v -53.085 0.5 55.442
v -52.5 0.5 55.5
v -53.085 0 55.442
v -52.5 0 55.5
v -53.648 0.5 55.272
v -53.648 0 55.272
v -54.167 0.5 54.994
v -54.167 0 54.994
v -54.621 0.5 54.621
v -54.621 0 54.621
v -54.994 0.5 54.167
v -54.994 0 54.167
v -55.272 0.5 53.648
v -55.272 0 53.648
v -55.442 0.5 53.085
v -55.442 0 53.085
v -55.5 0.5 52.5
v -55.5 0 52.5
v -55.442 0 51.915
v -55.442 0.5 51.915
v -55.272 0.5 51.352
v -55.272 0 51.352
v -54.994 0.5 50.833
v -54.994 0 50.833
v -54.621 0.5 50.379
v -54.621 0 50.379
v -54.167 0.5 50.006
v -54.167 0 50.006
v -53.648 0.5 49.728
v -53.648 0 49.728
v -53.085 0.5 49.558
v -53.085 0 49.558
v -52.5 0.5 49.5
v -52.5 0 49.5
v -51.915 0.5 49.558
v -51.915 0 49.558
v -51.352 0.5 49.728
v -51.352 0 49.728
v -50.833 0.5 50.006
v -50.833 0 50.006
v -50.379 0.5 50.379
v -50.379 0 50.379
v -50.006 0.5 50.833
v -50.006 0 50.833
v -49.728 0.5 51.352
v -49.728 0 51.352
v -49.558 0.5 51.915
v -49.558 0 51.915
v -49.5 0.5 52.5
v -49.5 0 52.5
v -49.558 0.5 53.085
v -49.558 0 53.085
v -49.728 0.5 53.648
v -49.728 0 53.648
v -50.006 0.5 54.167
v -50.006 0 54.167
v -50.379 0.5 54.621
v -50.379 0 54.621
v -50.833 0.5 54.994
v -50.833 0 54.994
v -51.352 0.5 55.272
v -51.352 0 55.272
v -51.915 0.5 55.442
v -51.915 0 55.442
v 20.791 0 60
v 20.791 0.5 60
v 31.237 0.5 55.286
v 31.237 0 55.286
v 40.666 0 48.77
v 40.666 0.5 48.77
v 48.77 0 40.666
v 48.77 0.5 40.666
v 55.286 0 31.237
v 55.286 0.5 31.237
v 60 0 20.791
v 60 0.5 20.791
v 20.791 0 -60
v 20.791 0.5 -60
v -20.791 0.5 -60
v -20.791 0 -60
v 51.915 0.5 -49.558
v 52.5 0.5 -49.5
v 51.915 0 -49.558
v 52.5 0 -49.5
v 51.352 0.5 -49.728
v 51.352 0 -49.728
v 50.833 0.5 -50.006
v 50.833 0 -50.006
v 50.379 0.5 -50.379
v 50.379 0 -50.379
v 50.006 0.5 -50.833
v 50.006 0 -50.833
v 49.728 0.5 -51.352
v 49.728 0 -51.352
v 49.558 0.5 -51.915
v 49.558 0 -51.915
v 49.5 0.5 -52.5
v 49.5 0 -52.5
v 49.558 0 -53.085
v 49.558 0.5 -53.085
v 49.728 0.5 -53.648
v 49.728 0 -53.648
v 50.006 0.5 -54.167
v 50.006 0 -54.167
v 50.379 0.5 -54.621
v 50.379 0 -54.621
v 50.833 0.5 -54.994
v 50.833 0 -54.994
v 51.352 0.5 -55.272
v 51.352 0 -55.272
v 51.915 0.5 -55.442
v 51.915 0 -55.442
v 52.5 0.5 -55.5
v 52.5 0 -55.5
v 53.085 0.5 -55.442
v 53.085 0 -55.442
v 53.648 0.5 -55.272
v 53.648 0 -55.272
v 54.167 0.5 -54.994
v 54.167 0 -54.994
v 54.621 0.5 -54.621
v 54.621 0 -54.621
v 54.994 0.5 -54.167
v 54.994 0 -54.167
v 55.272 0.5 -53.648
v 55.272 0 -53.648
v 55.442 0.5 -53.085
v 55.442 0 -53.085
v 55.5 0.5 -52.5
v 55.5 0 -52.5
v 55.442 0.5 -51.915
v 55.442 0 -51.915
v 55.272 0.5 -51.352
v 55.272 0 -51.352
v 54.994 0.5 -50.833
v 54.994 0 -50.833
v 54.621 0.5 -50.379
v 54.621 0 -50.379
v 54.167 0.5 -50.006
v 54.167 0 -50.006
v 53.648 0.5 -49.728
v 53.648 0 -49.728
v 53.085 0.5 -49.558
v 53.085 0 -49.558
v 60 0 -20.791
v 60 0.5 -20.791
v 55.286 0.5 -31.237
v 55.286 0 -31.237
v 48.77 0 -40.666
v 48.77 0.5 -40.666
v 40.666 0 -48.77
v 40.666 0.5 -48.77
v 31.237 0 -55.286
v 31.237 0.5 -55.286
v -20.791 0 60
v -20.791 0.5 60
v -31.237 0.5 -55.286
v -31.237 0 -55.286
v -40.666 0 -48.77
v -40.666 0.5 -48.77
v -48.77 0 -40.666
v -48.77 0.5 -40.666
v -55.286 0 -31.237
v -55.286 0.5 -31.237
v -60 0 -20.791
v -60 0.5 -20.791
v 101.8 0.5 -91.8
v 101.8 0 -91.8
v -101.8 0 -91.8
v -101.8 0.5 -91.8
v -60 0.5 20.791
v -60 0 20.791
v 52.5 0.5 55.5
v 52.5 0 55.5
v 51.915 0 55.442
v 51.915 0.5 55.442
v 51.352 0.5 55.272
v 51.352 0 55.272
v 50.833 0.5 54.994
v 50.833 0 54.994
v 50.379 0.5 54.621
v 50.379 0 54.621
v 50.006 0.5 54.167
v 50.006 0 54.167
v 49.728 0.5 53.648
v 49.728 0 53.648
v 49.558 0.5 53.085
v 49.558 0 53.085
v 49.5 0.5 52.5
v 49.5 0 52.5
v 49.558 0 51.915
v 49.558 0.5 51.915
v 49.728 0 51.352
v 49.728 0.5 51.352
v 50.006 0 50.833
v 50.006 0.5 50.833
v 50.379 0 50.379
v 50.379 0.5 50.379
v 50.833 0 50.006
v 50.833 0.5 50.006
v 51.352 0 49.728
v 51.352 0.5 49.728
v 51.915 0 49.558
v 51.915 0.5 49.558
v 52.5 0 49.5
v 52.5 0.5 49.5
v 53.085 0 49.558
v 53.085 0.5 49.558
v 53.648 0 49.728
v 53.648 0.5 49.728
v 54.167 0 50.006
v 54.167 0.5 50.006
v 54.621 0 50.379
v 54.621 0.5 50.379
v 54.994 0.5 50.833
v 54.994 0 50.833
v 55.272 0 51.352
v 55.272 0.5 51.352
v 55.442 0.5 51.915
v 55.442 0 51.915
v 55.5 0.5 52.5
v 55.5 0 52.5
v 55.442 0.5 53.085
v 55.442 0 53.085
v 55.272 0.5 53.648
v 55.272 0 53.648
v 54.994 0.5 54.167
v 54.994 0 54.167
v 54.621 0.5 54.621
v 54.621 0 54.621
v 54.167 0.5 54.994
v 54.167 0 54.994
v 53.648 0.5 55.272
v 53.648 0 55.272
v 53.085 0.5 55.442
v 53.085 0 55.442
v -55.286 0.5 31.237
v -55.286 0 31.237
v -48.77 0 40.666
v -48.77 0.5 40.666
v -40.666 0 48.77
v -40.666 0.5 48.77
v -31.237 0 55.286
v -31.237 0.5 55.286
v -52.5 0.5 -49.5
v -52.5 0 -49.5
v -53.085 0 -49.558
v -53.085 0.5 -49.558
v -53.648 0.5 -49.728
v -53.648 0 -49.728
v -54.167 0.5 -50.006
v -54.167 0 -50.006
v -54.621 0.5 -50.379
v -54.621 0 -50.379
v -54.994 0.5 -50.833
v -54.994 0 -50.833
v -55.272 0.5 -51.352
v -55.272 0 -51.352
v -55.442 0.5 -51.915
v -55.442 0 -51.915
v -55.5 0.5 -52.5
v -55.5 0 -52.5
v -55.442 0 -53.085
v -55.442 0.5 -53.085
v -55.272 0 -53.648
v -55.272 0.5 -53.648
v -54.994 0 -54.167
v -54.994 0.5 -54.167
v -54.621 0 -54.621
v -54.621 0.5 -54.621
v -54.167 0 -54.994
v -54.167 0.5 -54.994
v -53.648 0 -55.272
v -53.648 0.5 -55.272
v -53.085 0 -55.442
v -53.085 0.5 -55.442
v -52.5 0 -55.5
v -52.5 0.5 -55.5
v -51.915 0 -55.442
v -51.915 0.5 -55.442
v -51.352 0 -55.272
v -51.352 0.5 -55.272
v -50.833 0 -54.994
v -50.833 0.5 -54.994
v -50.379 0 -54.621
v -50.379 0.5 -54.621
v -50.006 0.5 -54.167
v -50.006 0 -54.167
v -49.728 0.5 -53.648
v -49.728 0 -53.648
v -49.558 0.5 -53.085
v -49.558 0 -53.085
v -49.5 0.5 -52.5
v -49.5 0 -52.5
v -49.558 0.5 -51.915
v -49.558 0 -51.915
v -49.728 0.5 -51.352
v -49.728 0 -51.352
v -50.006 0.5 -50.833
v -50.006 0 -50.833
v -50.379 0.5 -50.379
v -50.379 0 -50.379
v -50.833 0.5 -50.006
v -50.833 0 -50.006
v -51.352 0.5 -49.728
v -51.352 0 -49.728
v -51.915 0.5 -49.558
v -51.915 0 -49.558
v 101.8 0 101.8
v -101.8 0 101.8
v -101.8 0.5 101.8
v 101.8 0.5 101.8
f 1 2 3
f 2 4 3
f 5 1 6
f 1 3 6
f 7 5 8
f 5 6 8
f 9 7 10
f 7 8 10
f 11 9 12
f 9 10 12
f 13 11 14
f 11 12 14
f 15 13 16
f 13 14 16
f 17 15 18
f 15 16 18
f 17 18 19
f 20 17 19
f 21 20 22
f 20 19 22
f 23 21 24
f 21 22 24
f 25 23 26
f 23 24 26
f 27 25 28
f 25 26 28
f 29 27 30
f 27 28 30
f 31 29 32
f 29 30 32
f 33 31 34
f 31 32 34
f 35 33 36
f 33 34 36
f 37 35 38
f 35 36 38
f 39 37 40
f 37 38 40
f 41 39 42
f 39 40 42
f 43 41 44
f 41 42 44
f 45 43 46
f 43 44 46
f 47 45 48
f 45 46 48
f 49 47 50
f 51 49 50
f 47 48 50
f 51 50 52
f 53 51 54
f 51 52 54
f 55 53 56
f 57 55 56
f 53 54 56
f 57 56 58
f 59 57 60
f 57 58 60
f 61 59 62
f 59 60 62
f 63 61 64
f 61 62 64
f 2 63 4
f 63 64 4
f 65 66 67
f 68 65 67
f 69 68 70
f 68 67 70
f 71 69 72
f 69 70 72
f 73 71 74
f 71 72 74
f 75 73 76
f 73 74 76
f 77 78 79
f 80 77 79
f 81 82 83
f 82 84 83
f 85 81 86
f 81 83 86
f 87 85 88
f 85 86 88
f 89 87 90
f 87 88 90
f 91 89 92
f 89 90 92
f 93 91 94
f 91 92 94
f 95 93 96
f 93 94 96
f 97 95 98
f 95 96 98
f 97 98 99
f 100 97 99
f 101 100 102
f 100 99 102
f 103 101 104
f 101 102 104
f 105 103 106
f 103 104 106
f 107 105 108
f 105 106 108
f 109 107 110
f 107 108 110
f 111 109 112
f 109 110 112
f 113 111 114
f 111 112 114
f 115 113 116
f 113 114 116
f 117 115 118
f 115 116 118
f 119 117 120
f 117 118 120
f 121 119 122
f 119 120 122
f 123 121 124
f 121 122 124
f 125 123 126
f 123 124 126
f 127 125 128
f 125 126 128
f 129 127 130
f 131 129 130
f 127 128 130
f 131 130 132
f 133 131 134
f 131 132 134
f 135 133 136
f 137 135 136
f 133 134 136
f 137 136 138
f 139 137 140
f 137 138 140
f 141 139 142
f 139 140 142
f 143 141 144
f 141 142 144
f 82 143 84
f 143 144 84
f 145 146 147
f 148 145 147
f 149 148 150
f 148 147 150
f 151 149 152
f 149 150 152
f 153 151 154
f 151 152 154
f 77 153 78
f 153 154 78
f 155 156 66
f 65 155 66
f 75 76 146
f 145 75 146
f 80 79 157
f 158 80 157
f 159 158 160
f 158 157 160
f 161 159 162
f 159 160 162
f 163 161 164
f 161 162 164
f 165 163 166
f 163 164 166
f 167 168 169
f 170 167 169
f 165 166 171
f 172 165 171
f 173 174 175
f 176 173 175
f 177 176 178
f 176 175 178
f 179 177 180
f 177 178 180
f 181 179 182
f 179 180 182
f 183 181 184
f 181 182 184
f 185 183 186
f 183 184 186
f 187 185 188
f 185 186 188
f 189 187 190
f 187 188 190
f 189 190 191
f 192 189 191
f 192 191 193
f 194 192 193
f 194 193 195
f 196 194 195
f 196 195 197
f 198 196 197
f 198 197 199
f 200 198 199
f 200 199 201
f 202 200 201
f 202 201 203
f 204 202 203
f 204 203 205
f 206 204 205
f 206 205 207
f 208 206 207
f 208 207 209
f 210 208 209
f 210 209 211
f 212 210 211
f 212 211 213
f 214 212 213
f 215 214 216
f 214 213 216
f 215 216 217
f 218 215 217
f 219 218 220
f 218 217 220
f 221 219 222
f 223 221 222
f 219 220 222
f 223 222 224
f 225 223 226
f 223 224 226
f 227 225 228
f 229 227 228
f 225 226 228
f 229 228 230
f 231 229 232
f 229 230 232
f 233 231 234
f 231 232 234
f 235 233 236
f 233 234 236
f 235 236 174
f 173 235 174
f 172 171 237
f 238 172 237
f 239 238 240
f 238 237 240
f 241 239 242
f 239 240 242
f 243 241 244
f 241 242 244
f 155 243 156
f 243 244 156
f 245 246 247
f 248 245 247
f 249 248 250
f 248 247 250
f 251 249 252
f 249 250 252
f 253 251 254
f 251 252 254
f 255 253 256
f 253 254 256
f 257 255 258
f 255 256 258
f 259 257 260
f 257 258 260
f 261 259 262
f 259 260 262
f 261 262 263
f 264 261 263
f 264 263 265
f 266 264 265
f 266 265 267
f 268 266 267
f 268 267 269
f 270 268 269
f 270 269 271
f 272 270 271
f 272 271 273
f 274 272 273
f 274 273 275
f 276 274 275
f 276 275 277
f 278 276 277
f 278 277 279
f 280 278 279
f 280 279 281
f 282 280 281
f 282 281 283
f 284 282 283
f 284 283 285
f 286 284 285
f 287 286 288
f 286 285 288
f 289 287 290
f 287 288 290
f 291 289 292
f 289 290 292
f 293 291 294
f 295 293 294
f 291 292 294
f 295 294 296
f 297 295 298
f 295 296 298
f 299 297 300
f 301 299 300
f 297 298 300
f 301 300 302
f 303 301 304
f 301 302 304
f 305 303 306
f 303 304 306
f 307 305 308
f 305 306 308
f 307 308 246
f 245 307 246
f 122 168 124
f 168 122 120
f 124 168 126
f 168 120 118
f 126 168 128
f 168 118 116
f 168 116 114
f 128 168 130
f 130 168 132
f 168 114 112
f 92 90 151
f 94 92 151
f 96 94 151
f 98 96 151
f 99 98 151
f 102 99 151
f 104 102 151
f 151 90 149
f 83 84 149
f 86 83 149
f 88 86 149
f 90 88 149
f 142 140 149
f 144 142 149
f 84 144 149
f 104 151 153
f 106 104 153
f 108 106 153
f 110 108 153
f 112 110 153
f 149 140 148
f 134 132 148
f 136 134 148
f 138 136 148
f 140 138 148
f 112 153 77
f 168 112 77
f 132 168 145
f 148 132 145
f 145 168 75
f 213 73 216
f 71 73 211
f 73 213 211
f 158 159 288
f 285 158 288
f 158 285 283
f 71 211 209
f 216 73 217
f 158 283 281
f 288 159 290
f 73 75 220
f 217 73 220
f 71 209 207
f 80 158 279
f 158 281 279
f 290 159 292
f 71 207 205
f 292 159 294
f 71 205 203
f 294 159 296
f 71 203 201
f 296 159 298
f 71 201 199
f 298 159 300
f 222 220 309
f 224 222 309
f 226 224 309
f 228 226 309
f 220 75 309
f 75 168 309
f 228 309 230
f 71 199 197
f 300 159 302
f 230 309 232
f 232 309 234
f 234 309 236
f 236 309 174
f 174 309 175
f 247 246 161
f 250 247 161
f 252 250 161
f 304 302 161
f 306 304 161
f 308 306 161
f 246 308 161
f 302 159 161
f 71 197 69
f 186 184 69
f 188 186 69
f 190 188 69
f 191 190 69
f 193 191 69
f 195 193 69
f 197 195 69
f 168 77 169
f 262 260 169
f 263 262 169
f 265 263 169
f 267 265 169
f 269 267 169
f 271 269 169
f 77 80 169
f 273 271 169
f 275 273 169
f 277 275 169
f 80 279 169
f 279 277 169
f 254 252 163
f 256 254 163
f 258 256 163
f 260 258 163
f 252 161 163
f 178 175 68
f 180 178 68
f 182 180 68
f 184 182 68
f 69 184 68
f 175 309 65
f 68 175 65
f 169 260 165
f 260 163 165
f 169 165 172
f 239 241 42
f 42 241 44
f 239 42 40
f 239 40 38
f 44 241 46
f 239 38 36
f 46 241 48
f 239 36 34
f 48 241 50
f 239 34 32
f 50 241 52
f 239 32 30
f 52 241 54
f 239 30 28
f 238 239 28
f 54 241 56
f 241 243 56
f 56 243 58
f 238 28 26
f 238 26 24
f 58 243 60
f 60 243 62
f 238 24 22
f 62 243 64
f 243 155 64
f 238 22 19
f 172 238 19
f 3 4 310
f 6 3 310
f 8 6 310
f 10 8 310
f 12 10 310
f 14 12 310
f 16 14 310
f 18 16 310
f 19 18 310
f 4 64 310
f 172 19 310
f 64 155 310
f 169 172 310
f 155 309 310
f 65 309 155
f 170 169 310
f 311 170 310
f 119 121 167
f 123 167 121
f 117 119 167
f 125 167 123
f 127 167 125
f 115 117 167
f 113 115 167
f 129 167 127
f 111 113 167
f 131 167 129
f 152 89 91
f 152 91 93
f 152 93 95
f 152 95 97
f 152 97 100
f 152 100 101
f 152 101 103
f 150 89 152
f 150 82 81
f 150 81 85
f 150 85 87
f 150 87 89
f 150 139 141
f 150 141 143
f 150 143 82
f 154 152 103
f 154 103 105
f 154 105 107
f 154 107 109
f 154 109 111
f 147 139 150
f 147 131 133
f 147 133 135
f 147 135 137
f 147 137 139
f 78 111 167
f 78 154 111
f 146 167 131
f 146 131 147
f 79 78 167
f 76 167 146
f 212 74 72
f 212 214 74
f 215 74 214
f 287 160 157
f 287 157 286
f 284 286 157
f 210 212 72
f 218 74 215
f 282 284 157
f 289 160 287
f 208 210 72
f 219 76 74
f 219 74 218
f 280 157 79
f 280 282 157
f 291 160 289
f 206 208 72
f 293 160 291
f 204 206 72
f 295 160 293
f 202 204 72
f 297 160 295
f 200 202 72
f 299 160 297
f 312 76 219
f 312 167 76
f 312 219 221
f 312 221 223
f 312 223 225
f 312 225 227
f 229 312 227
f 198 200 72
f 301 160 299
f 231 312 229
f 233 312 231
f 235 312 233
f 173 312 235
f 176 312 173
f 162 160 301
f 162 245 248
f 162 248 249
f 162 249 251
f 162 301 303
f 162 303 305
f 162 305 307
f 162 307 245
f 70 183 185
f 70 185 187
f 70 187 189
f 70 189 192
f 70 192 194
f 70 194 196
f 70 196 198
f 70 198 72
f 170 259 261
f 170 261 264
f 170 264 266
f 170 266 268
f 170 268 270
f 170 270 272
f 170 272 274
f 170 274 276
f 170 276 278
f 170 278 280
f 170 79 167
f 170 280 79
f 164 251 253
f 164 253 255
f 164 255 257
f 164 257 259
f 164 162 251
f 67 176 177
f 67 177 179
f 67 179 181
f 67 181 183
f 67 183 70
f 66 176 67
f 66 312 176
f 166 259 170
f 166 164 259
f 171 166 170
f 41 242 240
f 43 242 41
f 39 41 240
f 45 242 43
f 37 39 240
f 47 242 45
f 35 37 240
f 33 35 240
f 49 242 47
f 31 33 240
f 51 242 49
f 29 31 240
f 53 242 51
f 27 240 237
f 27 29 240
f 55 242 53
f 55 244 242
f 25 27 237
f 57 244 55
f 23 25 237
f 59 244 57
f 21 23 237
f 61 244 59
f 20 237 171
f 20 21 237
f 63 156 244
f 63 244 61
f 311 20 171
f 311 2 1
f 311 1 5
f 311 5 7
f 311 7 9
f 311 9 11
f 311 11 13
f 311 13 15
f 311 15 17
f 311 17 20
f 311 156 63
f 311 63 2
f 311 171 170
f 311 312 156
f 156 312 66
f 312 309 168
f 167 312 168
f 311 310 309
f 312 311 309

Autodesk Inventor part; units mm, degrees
ref_plane "YZ Plane" through (0, 0, 0) normal (1, 0, 0) x (0, 1, 0)
ref_plane "XZ Plane" through (0, 0, 0) normal (0, 1, 0) x (-1, 0, 0)
ref_plane "XY Plane" through (0, 0, 0) normal (0, 0, 1) x (1, 0, 0)
sketch "Sketch1" plane through (0, 0, 0) normal (0, 1, 0) x (-1, 0, 0)
  line L0 (101.8, 101.8) -> (-101.8, 101.8)
  line L1 (-101.8, 101.8) -> (-101.8, -91.8)
  line L2 (-101.8, -91.8) -> (101.8, -91.8)
  line L3 (101.8, -91.8) -> (101.8, 101.8)
  point P0 (0, 101.8)
  point P1 (101.8, 5)
  dimension "d0" = 203.6
  dimension "d1" = 193.6
extrude "Plate1" add sketch "Sketch1" along normal blind 0.5
sketch "Sketch2" plane through (0, 0.5, 0) normal (0, 1, 0) x (1, 0, 0)
  line L0 (-52.5, -52.5) -> (52.5, 52.5) construction
  line L1 (52.5, -52.5) -> (-52.5, 52.5) construction
  point P0 (0, 0)
  point P1 (0, 0)
  dimension "d7" = 105
  dimension "d8" = 105
hole "Hole1" at (-52.5, 0.5, 52.5) at (-52.5, 0.5, -52.5) at (52.5, 0.5, 52.5) at (52.5, 0.5, -52.5) direction (0, -1, 0) diameter 6 depth 0.5 tip angle 118
sketch "Sketch3" plane through (0, 0.5, 0) normal (0, 1, 0) x (1, 0, 0)
  line L0 (-60, -60) -> (60, -60)
  line L1 (60, -60) -> (60, 60)
  line L2 (60, 60) -> (-60, 60)
  line L3 (-60, 60) -> (-60, -60)
  arc A0 (-60, -20.7906) -> (-20.7906, -60) centre (0, 0) ccw
  arc A1 (20.7906, -60) -> (60, -20.7906) centre (0, 0) ccw
  arc A2 (60, 20.7906) -> (20.7906, 60) centre (0, 0) ccw
  arc A3 (-20.7906, 60) -> (-60, 20.7906) centre (0, 0) ccw
  point P0 (0, -48.7613)
  point P1 (-70.0637, 0)
  point P2 (-60, 0)
  point P3 (0, -60)
  dimension "d17" = 120
extrude "Cut1" cut sketch "Sketch3" against normal blind 0.5 contours A0 L3 A3 L2 A2 L1 A1 L0
equation "\"d8\" = d7"
equation "\"d14\" = Thickness"
equation "\"d19\" = Thickness"
equation "\"d2\" = Thickness"
equation "\"BendRadius\" = Thickness"
equation "\"BendReliefWidth\" = Thickness"
equation "\"BendReliefDepth\" = 0.5 * Thickness"
equation "\"CornerReliefSize\" = 4 * Thickness"
equation "\"MinimumRemnant\" = 2 * Thickness"
equation "\"TransitionRadius\" = BendRadius"
equation "\"JacobiRadiusSize\" = BendRadius"
equation "\"GapSize\" = Thickness"
equation "\"Thickness\" = 0.5"
properties part number "top panel" material "Stainless Steel"
